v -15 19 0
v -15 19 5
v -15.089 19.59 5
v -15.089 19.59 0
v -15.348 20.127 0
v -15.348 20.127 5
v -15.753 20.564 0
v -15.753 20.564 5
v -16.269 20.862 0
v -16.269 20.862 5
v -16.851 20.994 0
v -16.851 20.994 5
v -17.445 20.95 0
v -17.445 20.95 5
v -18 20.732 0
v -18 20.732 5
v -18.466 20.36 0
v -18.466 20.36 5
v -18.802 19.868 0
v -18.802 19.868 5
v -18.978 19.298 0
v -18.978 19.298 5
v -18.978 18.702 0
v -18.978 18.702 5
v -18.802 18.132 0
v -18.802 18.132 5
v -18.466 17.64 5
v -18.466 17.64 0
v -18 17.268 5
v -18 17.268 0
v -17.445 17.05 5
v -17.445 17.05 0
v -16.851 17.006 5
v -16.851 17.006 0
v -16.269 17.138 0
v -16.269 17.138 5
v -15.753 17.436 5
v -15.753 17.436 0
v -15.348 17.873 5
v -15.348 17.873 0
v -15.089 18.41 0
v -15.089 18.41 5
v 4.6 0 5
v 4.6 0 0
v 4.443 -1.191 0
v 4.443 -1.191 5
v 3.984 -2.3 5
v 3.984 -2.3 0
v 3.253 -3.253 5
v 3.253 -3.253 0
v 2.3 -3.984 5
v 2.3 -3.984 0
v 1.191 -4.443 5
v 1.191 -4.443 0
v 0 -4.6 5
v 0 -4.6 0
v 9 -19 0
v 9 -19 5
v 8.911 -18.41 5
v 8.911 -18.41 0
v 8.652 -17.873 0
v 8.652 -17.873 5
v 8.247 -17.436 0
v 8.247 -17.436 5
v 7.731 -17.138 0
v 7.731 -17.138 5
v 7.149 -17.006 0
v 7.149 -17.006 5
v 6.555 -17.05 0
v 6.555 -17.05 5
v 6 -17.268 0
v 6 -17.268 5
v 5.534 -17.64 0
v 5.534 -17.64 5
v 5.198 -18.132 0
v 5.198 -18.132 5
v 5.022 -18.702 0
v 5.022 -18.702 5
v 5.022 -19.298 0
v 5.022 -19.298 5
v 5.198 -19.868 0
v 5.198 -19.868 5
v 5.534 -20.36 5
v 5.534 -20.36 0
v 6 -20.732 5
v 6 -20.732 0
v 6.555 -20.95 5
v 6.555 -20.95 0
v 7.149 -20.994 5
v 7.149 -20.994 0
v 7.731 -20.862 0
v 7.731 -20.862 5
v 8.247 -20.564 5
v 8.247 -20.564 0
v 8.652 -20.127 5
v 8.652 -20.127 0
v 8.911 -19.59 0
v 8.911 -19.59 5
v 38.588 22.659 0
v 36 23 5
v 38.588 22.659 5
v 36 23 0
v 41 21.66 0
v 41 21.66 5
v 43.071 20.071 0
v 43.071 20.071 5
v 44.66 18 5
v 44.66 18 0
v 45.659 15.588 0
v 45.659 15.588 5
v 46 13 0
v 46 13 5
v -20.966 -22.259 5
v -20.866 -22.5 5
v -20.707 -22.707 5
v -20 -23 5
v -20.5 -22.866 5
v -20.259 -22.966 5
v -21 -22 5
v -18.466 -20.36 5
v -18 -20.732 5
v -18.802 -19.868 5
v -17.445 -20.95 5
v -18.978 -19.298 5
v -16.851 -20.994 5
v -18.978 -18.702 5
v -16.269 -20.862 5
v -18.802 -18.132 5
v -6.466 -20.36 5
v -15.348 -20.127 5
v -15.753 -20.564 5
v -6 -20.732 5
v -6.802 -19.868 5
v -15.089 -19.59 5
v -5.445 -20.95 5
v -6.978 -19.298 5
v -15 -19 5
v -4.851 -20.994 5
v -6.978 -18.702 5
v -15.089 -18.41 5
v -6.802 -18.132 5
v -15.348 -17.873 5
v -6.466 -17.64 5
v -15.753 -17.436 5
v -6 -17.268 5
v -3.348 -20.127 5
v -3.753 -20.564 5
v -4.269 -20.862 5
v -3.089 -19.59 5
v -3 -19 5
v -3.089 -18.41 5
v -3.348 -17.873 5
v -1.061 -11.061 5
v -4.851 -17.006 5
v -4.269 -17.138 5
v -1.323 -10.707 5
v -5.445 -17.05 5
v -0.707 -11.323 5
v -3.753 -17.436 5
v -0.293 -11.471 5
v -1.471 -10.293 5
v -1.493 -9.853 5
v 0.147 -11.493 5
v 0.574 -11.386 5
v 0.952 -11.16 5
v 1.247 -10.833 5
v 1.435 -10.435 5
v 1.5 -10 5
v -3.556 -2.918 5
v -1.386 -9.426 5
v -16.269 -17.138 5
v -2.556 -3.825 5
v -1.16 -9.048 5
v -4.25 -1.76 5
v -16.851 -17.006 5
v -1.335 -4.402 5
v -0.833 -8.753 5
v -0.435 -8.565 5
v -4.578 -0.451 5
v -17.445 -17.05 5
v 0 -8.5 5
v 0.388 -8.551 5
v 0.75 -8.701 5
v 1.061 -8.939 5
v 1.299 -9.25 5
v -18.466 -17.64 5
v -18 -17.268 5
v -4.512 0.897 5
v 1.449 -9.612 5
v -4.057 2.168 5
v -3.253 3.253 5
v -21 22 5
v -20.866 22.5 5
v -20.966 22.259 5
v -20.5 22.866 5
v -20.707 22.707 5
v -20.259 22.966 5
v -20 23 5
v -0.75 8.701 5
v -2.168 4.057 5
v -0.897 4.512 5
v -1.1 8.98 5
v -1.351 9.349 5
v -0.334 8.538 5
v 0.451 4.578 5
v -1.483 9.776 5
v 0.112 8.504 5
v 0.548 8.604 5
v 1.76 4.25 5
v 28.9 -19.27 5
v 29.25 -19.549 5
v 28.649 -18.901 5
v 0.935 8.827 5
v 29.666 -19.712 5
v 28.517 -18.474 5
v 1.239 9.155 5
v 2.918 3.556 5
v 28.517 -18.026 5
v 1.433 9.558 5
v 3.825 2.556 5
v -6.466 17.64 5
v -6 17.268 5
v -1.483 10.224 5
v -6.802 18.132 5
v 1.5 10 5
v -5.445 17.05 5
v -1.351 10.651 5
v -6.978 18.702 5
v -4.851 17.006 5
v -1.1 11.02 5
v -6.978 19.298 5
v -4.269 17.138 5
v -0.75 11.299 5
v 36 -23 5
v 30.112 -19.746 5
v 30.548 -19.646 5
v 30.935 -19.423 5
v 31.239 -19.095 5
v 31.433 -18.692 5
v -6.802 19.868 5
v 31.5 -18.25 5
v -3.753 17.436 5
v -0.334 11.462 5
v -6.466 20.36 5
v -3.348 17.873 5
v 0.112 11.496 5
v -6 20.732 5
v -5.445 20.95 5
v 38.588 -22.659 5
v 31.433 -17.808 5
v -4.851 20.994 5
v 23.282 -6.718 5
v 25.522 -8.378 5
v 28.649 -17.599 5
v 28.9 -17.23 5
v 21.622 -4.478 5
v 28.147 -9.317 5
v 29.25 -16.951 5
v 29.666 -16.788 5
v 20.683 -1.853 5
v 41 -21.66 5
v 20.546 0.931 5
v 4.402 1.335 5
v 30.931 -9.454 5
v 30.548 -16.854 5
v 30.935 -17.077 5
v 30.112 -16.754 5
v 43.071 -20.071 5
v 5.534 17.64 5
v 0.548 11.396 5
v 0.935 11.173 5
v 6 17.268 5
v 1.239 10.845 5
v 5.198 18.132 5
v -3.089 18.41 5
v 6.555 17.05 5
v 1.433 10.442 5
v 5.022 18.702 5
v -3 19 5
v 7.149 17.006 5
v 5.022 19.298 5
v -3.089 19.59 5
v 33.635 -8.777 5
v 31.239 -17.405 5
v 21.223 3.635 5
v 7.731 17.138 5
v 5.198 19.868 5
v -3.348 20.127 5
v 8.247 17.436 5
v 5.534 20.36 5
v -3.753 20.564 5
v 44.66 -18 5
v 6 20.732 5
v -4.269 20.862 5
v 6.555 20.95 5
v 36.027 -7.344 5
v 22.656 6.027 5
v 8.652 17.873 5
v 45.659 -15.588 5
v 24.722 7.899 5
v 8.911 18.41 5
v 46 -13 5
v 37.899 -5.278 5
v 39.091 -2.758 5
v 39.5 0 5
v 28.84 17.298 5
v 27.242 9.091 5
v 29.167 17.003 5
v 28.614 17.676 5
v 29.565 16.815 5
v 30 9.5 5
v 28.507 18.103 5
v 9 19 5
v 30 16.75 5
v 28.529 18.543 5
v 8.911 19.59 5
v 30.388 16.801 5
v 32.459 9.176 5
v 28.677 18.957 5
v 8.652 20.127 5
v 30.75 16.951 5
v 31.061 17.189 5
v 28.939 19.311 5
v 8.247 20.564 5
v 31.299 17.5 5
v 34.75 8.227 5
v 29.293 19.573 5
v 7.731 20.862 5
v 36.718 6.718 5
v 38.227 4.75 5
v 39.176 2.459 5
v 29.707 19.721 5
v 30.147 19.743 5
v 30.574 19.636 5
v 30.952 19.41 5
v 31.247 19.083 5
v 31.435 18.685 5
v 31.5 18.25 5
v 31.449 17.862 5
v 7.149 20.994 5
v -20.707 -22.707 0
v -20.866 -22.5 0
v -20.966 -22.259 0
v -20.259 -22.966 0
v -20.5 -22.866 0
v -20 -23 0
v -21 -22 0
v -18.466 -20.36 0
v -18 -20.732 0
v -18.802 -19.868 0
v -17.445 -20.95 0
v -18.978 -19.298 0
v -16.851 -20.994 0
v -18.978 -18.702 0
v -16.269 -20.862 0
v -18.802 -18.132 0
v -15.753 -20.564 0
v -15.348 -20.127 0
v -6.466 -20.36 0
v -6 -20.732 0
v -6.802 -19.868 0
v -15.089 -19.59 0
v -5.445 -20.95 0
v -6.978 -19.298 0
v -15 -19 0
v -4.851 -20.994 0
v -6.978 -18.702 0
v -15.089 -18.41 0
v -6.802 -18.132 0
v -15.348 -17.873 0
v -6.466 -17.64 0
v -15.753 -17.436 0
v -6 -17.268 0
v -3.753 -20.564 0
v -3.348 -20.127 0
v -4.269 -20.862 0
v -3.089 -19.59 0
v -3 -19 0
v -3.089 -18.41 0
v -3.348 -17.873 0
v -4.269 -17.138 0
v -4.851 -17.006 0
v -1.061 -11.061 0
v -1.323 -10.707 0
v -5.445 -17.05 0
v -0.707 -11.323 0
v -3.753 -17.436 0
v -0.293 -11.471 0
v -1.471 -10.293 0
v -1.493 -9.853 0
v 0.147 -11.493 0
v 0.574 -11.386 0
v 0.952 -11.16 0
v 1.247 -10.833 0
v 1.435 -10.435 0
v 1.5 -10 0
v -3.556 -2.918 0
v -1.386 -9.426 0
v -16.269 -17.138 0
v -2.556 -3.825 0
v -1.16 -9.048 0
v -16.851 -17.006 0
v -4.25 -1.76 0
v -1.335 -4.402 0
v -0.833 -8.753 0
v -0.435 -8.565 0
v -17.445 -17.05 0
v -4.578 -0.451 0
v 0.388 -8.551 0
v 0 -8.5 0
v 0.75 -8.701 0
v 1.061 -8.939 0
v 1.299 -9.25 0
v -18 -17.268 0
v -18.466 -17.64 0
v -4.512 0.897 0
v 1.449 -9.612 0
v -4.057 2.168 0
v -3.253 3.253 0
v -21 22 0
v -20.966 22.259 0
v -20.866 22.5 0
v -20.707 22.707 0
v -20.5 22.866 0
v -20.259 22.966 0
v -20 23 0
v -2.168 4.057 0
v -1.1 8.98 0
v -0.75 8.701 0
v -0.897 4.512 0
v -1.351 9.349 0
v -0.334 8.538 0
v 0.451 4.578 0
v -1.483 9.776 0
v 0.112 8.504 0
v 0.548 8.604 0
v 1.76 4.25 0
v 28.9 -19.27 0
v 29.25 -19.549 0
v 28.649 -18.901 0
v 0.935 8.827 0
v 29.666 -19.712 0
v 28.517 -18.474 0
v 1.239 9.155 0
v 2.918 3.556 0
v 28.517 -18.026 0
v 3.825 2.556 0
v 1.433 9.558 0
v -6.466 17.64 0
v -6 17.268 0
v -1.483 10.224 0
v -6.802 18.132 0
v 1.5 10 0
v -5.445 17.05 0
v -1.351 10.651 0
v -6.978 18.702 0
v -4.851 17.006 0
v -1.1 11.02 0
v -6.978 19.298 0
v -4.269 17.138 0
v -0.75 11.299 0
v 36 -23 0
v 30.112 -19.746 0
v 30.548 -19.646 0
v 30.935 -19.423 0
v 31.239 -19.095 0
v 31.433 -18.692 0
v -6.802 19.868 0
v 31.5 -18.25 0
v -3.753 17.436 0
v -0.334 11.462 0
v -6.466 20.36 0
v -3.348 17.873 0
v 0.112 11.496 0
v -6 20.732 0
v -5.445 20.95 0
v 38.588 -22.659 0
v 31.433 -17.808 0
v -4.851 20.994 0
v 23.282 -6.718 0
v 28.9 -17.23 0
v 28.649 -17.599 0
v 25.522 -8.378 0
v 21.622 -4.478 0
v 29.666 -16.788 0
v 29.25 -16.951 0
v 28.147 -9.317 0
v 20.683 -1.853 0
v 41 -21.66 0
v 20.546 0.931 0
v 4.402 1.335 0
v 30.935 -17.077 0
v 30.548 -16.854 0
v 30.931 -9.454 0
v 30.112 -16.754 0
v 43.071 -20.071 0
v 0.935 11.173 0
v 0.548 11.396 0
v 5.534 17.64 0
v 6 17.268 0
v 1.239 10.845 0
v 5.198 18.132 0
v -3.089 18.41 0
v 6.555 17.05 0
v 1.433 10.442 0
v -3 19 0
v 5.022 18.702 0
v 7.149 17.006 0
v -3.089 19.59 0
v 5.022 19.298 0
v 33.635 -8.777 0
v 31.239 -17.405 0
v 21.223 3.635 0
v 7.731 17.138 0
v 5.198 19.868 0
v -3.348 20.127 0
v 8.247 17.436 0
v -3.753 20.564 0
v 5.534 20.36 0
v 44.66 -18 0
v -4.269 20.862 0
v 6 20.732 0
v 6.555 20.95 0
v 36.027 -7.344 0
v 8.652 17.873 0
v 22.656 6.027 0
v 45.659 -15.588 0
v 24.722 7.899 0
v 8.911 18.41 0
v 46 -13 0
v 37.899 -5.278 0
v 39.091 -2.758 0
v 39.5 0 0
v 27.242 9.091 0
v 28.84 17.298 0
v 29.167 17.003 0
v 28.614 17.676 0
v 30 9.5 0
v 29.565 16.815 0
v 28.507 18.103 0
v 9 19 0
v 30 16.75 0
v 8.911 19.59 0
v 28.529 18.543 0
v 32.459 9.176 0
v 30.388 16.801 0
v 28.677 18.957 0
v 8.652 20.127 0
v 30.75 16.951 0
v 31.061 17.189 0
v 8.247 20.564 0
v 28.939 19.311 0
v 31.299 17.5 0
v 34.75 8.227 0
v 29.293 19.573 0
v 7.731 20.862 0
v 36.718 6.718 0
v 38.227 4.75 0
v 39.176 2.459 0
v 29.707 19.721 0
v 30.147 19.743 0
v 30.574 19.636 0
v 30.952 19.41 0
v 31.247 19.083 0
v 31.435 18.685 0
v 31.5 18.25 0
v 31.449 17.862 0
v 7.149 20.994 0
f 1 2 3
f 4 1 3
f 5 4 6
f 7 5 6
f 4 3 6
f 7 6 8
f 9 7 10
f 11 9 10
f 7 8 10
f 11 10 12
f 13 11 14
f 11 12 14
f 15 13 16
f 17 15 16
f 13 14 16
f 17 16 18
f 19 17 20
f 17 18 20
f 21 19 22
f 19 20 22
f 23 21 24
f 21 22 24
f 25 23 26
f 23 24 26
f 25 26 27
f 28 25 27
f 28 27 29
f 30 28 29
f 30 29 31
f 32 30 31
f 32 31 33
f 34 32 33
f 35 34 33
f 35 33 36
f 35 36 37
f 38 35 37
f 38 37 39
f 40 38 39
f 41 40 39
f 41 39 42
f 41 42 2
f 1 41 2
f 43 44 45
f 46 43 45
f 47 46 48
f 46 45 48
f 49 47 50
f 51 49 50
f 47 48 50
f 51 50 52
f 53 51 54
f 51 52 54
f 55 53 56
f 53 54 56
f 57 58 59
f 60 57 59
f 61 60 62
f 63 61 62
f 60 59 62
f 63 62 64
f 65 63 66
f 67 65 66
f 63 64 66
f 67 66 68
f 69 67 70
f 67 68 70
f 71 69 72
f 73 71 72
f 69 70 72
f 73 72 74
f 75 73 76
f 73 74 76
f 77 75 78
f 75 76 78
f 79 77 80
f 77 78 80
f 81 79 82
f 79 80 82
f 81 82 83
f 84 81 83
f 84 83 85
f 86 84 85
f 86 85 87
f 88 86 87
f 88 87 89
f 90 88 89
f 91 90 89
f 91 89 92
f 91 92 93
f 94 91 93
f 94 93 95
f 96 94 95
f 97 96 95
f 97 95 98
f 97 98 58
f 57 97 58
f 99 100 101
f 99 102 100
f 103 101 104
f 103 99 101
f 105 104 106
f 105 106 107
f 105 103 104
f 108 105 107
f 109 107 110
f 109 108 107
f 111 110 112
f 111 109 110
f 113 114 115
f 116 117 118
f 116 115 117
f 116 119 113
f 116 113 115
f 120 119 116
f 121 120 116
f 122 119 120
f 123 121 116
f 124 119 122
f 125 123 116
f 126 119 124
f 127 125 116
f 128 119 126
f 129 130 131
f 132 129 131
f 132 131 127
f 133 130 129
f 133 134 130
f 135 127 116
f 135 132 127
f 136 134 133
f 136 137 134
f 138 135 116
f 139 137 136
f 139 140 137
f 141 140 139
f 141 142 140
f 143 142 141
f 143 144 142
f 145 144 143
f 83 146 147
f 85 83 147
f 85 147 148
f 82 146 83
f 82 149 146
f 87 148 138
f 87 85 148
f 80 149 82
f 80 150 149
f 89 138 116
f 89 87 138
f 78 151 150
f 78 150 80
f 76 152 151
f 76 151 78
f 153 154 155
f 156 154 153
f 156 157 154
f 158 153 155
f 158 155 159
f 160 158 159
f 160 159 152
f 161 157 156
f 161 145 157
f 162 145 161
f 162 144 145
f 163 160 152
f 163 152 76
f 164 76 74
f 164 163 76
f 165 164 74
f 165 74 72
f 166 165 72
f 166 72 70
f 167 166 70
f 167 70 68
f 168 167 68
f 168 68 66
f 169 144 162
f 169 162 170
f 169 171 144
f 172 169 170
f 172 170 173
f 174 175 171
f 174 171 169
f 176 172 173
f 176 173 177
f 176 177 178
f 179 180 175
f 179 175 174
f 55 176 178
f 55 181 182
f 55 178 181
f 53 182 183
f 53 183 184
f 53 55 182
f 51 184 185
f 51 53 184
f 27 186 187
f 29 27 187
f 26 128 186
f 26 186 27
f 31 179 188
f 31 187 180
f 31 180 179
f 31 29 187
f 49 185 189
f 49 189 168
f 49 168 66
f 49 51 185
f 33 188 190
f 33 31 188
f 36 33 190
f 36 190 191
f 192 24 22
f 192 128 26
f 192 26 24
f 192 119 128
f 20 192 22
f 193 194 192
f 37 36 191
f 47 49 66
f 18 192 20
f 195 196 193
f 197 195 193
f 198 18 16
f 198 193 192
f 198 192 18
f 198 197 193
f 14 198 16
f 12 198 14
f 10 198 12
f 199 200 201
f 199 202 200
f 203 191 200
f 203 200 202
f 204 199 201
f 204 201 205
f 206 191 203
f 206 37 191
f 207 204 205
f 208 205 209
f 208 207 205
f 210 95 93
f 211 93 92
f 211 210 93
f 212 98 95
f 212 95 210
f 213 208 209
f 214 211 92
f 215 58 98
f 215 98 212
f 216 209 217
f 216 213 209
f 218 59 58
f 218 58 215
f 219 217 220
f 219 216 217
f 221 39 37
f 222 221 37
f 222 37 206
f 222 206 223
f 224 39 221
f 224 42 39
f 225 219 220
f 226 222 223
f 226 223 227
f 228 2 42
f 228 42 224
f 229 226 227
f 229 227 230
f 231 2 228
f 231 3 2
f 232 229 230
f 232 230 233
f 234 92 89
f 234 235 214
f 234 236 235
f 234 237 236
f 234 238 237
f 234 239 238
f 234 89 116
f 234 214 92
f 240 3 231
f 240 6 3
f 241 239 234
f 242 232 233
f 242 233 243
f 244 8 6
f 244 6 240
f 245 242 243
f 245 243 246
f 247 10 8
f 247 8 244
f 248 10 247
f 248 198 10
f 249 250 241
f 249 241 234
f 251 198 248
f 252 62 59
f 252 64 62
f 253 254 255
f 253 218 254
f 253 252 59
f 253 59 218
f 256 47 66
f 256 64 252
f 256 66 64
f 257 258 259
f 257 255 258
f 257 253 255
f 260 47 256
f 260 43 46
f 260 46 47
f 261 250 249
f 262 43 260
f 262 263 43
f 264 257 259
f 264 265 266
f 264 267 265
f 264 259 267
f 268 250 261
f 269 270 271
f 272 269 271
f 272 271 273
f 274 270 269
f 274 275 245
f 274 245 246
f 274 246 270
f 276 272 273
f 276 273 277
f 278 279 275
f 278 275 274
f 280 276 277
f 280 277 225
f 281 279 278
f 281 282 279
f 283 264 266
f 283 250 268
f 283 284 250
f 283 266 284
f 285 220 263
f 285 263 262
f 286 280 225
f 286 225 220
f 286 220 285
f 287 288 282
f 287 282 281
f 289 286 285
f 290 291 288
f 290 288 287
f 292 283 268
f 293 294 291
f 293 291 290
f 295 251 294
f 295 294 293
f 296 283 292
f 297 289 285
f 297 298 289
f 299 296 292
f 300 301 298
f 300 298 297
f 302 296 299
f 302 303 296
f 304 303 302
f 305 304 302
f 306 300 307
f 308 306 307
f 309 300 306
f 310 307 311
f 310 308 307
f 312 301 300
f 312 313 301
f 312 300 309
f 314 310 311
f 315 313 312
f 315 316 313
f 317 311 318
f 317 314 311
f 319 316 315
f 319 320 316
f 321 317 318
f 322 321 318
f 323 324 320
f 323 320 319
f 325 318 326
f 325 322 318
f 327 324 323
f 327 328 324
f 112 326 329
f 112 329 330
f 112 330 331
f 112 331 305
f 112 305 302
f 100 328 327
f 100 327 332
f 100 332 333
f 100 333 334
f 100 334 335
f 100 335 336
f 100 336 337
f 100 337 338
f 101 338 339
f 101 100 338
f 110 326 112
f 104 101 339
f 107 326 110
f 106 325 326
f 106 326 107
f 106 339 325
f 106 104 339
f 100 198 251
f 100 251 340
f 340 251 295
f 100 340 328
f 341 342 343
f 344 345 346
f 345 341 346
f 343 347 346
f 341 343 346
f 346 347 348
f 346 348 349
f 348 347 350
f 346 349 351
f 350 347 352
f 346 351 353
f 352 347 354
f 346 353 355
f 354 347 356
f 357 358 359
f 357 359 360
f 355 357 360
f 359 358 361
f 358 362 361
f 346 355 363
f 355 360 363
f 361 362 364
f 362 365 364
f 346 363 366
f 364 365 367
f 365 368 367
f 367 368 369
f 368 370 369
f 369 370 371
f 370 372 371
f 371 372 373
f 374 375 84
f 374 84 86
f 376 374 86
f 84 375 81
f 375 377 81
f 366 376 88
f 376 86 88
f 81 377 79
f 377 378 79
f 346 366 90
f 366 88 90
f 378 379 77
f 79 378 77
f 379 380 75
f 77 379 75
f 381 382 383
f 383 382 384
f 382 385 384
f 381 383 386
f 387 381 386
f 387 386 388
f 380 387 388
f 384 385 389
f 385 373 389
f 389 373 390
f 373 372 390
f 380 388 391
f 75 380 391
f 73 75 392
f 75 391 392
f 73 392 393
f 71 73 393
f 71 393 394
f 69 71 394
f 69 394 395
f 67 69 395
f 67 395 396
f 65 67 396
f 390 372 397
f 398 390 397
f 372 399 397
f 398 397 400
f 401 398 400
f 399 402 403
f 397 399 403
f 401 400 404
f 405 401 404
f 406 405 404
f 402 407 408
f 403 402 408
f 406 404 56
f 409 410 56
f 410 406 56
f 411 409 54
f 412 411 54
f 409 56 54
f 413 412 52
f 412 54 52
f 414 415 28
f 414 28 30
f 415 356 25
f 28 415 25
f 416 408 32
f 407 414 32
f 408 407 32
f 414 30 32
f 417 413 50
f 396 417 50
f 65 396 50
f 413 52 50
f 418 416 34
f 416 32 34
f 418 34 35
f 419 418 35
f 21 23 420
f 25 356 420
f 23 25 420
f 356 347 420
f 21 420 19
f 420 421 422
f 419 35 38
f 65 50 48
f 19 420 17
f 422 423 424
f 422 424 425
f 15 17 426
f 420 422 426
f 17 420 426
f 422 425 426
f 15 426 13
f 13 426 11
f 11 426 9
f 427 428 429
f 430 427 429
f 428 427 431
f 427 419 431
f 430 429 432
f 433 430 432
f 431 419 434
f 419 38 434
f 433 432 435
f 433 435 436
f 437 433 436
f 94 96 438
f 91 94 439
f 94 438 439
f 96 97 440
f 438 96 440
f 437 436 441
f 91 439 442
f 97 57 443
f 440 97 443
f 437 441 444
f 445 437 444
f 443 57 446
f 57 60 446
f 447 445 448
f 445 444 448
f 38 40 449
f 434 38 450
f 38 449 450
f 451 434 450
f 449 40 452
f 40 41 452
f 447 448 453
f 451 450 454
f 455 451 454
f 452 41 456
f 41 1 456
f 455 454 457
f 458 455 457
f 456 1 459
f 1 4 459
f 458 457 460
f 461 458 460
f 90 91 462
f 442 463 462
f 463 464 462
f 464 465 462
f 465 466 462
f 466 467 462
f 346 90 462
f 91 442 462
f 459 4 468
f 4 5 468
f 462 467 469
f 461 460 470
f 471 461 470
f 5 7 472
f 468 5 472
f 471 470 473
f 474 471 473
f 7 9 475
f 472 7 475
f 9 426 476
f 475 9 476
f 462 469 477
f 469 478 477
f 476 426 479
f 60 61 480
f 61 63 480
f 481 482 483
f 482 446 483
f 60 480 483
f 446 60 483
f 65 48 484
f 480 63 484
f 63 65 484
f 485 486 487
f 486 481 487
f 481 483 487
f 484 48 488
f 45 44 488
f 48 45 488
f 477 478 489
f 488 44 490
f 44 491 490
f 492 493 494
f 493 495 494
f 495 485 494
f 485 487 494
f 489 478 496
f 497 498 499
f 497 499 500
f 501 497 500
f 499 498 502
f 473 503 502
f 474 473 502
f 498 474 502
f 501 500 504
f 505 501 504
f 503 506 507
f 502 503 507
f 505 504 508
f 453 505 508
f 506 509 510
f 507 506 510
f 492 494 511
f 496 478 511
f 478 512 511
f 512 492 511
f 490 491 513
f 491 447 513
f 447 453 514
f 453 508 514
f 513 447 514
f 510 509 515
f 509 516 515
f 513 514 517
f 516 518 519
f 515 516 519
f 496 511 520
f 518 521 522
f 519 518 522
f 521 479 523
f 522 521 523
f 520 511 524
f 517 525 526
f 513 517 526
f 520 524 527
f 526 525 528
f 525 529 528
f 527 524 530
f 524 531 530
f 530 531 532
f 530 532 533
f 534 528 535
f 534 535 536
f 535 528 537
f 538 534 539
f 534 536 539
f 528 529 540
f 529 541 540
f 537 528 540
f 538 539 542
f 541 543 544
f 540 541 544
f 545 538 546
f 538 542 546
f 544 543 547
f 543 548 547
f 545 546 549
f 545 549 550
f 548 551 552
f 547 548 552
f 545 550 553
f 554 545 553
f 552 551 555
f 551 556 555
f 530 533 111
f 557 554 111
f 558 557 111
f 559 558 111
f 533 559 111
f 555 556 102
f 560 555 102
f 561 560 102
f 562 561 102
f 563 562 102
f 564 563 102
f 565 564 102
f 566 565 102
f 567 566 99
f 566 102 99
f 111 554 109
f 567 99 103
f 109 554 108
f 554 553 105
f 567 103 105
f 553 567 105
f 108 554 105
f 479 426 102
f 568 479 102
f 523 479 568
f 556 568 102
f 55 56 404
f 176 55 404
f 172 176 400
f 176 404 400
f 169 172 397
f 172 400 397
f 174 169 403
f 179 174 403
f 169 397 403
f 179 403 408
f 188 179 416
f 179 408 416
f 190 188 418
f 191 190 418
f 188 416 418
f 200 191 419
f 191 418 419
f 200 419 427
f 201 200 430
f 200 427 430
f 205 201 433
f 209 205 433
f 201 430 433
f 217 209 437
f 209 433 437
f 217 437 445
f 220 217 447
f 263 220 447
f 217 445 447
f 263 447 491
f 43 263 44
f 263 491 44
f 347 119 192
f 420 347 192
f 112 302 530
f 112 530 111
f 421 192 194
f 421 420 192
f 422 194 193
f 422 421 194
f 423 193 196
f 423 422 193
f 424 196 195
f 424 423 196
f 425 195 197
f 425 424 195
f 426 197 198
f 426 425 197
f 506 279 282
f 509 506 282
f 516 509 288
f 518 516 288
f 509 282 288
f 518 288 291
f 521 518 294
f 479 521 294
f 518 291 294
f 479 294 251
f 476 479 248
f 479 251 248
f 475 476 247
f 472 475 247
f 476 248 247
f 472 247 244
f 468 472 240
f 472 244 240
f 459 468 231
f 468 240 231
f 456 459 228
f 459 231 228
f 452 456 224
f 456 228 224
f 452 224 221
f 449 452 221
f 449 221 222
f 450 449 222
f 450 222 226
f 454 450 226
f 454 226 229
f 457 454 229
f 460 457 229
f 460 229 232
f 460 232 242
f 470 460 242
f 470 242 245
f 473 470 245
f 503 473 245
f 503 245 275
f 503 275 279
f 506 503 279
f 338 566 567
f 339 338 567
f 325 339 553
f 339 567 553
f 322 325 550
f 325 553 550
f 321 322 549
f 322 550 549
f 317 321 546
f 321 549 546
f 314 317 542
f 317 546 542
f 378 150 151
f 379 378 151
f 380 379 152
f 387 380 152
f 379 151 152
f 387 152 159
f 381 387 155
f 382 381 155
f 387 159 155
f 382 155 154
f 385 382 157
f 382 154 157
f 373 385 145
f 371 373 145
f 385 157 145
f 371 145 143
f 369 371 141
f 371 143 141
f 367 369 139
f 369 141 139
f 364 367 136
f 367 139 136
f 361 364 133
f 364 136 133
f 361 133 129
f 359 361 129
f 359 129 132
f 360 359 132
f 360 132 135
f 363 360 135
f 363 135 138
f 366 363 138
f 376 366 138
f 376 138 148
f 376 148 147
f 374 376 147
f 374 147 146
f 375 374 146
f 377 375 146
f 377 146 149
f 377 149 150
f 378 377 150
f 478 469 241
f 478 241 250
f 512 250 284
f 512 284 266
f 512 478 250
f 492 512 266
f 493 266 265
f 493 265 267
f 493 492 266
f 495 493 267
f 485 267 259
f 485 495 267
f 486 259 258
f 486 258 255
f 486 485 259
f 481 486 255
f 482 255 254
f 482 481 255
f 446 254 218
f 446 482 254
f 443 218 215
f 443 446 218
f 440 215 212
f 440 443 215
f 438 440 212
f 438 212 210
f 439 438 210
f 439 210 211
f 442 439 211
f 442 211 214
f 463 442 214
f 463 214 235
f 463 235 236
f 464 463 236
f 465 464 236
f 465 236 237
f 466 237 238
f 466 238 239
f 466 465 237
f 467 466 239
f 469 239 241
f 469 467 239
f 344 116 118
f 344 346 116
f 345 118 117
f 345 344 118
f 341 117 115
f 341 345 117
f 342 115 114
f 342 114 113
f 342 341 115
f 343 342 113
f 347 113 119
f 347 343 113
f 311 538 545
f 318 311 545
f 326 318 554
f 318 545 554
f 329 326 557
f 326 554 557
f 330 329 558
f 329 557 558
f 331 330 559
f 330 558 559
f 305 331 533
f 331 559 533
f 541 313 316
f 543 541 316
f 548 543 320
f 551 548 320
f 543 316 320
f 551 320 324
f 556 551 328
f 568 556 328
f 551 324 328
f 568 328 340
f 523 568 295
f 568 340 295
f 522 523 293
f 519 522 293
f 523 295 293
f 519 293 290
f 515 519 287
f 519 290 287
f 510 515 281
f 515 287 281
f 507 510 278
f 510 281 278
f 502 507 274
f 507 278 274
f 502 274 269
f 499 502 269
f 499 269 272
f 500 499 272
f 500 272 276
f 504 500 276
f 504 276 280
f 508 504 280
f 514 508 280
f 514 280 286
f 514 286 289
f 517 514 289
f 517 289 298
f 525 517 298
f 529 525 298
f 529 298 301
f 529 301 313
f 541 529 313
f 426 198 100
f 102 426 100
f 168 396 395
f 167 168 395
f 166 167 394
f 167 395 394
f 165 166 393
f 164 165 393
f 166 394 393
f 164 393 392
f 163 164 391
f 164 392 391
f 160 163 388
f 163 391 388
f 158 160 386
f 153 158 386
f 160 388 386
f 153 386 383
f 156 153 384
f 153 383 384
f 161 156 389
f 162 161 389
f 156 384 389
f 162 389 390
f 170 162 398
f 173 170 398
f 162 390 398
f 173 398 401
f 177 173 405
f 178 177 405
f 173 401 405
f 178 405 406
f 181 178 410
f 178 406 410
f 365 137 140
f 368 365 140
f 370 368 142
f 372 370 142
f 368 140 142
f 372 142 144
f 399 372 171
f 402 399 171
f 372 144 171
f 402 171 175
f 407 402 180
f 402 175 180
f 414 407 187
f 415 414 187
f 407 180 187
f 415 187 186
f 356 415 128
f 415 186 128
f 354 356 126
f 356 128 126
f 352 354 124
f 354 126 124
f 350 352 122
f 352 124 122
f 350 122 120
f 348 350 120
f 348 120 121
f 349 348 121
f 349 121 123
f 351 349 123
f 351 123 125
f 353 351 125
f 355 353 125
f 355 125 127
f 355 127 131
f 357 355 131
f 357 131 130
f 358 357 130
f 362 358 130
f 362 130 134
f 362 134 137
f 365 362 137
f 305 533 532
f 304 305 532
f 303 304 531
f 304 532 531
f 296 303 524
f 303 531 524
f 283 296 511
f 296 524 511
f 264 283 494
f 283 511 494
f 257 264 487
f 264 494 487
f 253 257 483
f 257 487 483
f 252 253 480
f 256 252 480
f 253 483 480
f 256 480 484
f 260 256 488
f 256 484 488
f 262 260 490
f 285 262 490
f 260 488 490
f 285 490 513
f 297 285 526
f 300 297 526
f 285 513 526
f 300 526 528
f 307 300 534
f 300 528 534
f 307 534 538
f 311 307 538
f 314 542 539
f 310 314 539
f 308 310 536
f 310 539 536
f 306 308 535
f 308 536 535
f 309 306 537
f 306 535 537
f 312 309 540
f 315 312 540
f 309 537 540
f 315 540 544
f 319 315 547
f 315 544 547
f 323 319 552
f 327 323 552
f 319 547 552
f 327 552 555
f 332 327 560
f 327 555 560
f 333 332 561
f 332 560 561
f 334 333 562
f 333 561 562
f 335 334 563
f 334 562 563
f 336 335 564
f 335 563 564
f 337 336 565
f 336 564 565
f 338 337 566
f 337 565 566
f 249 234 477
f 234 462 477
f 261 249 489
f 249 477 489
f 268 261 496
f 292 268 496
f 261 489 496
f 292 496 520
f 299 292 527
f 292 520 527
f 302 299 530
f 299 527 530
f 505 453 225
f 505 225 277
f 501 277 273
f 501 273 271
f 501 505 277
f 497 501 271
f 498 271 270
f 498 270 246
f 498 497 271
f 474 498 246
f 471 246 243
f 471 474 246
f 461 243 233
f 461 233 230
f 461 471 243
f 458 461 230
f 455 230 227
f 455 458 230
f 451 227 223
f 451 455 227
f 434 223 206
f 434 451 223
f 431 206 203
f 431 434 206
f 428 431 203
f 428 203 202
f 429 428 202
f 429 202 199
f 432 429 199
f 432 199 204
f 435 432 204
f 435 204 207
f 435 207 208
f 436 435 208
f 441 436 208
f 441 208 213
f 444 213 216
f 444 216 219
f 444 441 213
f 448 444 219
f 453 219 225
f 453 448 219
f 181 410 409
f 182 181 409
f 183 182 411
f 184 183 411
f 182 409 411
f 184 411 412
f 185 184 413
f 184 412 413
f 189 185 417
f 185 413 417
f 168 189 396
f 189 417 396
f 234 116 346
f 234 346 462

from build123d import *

# Parameters (mm, degrees)
SKETCH1_W           = 65
SKETCH1_H           = 46
SKETCH1_R           = 1.5
BOSS_EXTRUDE1_DEPTH = 5
SKETCH2_R           = 2
CUT_EXTRUDE1_DEPTH  = 10
SKETCH3_W           = 4
SKETCH3_H           = 46
CUT_EXTRUDE2_DEPTH  = 6
SKETCH4_W           = 6
SKETCH4_H           = 46
BOSS_EXTRUDE2_DEPTH = 5
FILLET1_R           = 10
FILLET2_R           = 1


with BuildPart() as part:
    # Sketch1 → Boss-Extrude1 (new body)
    with BuildSketch(Plane.XY):
        with Locations((7.5, 0)):
            Rectangle(SKETCH1_W, SKETCH1_H)
        with BuildLine():
            ThreePointArc((4.6, 0), (3.252691193, -3.252691193), (0, -4.6))
            ThreePointArc((0, -4.6), (-3.252691193, 3.252691193), (4.6, 0))
        make_face(mode=Mode.SUBTRACT)
        with Locations((30, -18.25)):
            Circle(SKETCH1_R, mode=Mode.SUBTRACT)
        with BuildLine():
            ThreePointArc((1.5, -10), (-1.060660172, -11.060660172), (0, -8.5))
            ThreePointArc((0, -8.5), (1.060660172, -8.939339828), (1.5, -10))
        make_face(mode=Mode.SUBTRACT)
        with BuildLine():
            ThreePointArc((39.5, 0), (23.282485579, -6.717514421), (30, 9.5))
            ThreePointArc((30, 9.5), (36.717514421, 6.717514421), (39.5, 0))
        make_face(mode=Mode.SUBTRACT)
        with Locations((0, 10)):
            Circle(SKETCH1_R, mode=Mode.SUBTRACT)
        with BuildLine():
            ThreePointArc((31.5, 18.25), (31.060660172, 17.189339828), (30, 16.75))
            ThreePointArc((30, 16.75), (28.939339828, 19.310660172), (31.5, 18.25))
        make_face(mode=Mode.SUBTRACT)
    extrude(amount=BOSS_EXTRUDE1_DEPTH)

    # Sketch2 → Cut-Extrude1 (cut)
    with BuildSketch(Plane.XY.offset(5)):
        with Locations((7, 19)):
            Circle(SKETCH2_R)
        with Locations((-5, -19)):
            Circle(SKETCH2_R)
        with Locations((-17, 19)):
            Circle(SKETCH2_R)
        with Locations((-5, 19)):
            Circle(SKETCH2_R)
        with Locations((7, -19)):
            Circle(SKETCH2_R)
        with Locations((-17, -19)):
            Circle(SKETCH2_R)
    extrude(amount=-CUT_EXTRUDE1_DEPTH, mode=Mode.SUBTRACT)

    # Sketch3 → Cut-Extrude2 (cut, through all)
    with BuildSketch(Plane.XY.offset(5)):
        with Locations((-23, 0)):
            Rectangle(SKETCH3_W, SKETCH3_H)
    extrude(amount=-CUT_EXTRUDE2_DEPTH, mode=Mode.SUBTRACT)

    # Sketch4 → Boss-Extrude2 (add)
    with BuildSketch(Plane.XY.offset(5)):
        with Locations((43, 0)):
            Rectangle(SKETCH4_W, SKETCH4_H)
    extrude(amount=-BOSS_EXTRUDE2_DEPTH)

    # Fillet1
    fillet1_edges = [part.edges().sort_by_distance(p)[0] for p in [
        (46, -23, 2.5),
        (46, 23, 2.5),
    ]]
    fillet(fillet1_edges, radius=FILLET1_R)

    # Fillet2
    fillet2_edges = [part.edges().sort_by_distance(p)[0] for p in [
        (-21, 23, 2.5),
        (-21, -23, 2.5),
    ]]
    fillet(fillet2_edges, radius=FILLET2_R)


solid = part.part
